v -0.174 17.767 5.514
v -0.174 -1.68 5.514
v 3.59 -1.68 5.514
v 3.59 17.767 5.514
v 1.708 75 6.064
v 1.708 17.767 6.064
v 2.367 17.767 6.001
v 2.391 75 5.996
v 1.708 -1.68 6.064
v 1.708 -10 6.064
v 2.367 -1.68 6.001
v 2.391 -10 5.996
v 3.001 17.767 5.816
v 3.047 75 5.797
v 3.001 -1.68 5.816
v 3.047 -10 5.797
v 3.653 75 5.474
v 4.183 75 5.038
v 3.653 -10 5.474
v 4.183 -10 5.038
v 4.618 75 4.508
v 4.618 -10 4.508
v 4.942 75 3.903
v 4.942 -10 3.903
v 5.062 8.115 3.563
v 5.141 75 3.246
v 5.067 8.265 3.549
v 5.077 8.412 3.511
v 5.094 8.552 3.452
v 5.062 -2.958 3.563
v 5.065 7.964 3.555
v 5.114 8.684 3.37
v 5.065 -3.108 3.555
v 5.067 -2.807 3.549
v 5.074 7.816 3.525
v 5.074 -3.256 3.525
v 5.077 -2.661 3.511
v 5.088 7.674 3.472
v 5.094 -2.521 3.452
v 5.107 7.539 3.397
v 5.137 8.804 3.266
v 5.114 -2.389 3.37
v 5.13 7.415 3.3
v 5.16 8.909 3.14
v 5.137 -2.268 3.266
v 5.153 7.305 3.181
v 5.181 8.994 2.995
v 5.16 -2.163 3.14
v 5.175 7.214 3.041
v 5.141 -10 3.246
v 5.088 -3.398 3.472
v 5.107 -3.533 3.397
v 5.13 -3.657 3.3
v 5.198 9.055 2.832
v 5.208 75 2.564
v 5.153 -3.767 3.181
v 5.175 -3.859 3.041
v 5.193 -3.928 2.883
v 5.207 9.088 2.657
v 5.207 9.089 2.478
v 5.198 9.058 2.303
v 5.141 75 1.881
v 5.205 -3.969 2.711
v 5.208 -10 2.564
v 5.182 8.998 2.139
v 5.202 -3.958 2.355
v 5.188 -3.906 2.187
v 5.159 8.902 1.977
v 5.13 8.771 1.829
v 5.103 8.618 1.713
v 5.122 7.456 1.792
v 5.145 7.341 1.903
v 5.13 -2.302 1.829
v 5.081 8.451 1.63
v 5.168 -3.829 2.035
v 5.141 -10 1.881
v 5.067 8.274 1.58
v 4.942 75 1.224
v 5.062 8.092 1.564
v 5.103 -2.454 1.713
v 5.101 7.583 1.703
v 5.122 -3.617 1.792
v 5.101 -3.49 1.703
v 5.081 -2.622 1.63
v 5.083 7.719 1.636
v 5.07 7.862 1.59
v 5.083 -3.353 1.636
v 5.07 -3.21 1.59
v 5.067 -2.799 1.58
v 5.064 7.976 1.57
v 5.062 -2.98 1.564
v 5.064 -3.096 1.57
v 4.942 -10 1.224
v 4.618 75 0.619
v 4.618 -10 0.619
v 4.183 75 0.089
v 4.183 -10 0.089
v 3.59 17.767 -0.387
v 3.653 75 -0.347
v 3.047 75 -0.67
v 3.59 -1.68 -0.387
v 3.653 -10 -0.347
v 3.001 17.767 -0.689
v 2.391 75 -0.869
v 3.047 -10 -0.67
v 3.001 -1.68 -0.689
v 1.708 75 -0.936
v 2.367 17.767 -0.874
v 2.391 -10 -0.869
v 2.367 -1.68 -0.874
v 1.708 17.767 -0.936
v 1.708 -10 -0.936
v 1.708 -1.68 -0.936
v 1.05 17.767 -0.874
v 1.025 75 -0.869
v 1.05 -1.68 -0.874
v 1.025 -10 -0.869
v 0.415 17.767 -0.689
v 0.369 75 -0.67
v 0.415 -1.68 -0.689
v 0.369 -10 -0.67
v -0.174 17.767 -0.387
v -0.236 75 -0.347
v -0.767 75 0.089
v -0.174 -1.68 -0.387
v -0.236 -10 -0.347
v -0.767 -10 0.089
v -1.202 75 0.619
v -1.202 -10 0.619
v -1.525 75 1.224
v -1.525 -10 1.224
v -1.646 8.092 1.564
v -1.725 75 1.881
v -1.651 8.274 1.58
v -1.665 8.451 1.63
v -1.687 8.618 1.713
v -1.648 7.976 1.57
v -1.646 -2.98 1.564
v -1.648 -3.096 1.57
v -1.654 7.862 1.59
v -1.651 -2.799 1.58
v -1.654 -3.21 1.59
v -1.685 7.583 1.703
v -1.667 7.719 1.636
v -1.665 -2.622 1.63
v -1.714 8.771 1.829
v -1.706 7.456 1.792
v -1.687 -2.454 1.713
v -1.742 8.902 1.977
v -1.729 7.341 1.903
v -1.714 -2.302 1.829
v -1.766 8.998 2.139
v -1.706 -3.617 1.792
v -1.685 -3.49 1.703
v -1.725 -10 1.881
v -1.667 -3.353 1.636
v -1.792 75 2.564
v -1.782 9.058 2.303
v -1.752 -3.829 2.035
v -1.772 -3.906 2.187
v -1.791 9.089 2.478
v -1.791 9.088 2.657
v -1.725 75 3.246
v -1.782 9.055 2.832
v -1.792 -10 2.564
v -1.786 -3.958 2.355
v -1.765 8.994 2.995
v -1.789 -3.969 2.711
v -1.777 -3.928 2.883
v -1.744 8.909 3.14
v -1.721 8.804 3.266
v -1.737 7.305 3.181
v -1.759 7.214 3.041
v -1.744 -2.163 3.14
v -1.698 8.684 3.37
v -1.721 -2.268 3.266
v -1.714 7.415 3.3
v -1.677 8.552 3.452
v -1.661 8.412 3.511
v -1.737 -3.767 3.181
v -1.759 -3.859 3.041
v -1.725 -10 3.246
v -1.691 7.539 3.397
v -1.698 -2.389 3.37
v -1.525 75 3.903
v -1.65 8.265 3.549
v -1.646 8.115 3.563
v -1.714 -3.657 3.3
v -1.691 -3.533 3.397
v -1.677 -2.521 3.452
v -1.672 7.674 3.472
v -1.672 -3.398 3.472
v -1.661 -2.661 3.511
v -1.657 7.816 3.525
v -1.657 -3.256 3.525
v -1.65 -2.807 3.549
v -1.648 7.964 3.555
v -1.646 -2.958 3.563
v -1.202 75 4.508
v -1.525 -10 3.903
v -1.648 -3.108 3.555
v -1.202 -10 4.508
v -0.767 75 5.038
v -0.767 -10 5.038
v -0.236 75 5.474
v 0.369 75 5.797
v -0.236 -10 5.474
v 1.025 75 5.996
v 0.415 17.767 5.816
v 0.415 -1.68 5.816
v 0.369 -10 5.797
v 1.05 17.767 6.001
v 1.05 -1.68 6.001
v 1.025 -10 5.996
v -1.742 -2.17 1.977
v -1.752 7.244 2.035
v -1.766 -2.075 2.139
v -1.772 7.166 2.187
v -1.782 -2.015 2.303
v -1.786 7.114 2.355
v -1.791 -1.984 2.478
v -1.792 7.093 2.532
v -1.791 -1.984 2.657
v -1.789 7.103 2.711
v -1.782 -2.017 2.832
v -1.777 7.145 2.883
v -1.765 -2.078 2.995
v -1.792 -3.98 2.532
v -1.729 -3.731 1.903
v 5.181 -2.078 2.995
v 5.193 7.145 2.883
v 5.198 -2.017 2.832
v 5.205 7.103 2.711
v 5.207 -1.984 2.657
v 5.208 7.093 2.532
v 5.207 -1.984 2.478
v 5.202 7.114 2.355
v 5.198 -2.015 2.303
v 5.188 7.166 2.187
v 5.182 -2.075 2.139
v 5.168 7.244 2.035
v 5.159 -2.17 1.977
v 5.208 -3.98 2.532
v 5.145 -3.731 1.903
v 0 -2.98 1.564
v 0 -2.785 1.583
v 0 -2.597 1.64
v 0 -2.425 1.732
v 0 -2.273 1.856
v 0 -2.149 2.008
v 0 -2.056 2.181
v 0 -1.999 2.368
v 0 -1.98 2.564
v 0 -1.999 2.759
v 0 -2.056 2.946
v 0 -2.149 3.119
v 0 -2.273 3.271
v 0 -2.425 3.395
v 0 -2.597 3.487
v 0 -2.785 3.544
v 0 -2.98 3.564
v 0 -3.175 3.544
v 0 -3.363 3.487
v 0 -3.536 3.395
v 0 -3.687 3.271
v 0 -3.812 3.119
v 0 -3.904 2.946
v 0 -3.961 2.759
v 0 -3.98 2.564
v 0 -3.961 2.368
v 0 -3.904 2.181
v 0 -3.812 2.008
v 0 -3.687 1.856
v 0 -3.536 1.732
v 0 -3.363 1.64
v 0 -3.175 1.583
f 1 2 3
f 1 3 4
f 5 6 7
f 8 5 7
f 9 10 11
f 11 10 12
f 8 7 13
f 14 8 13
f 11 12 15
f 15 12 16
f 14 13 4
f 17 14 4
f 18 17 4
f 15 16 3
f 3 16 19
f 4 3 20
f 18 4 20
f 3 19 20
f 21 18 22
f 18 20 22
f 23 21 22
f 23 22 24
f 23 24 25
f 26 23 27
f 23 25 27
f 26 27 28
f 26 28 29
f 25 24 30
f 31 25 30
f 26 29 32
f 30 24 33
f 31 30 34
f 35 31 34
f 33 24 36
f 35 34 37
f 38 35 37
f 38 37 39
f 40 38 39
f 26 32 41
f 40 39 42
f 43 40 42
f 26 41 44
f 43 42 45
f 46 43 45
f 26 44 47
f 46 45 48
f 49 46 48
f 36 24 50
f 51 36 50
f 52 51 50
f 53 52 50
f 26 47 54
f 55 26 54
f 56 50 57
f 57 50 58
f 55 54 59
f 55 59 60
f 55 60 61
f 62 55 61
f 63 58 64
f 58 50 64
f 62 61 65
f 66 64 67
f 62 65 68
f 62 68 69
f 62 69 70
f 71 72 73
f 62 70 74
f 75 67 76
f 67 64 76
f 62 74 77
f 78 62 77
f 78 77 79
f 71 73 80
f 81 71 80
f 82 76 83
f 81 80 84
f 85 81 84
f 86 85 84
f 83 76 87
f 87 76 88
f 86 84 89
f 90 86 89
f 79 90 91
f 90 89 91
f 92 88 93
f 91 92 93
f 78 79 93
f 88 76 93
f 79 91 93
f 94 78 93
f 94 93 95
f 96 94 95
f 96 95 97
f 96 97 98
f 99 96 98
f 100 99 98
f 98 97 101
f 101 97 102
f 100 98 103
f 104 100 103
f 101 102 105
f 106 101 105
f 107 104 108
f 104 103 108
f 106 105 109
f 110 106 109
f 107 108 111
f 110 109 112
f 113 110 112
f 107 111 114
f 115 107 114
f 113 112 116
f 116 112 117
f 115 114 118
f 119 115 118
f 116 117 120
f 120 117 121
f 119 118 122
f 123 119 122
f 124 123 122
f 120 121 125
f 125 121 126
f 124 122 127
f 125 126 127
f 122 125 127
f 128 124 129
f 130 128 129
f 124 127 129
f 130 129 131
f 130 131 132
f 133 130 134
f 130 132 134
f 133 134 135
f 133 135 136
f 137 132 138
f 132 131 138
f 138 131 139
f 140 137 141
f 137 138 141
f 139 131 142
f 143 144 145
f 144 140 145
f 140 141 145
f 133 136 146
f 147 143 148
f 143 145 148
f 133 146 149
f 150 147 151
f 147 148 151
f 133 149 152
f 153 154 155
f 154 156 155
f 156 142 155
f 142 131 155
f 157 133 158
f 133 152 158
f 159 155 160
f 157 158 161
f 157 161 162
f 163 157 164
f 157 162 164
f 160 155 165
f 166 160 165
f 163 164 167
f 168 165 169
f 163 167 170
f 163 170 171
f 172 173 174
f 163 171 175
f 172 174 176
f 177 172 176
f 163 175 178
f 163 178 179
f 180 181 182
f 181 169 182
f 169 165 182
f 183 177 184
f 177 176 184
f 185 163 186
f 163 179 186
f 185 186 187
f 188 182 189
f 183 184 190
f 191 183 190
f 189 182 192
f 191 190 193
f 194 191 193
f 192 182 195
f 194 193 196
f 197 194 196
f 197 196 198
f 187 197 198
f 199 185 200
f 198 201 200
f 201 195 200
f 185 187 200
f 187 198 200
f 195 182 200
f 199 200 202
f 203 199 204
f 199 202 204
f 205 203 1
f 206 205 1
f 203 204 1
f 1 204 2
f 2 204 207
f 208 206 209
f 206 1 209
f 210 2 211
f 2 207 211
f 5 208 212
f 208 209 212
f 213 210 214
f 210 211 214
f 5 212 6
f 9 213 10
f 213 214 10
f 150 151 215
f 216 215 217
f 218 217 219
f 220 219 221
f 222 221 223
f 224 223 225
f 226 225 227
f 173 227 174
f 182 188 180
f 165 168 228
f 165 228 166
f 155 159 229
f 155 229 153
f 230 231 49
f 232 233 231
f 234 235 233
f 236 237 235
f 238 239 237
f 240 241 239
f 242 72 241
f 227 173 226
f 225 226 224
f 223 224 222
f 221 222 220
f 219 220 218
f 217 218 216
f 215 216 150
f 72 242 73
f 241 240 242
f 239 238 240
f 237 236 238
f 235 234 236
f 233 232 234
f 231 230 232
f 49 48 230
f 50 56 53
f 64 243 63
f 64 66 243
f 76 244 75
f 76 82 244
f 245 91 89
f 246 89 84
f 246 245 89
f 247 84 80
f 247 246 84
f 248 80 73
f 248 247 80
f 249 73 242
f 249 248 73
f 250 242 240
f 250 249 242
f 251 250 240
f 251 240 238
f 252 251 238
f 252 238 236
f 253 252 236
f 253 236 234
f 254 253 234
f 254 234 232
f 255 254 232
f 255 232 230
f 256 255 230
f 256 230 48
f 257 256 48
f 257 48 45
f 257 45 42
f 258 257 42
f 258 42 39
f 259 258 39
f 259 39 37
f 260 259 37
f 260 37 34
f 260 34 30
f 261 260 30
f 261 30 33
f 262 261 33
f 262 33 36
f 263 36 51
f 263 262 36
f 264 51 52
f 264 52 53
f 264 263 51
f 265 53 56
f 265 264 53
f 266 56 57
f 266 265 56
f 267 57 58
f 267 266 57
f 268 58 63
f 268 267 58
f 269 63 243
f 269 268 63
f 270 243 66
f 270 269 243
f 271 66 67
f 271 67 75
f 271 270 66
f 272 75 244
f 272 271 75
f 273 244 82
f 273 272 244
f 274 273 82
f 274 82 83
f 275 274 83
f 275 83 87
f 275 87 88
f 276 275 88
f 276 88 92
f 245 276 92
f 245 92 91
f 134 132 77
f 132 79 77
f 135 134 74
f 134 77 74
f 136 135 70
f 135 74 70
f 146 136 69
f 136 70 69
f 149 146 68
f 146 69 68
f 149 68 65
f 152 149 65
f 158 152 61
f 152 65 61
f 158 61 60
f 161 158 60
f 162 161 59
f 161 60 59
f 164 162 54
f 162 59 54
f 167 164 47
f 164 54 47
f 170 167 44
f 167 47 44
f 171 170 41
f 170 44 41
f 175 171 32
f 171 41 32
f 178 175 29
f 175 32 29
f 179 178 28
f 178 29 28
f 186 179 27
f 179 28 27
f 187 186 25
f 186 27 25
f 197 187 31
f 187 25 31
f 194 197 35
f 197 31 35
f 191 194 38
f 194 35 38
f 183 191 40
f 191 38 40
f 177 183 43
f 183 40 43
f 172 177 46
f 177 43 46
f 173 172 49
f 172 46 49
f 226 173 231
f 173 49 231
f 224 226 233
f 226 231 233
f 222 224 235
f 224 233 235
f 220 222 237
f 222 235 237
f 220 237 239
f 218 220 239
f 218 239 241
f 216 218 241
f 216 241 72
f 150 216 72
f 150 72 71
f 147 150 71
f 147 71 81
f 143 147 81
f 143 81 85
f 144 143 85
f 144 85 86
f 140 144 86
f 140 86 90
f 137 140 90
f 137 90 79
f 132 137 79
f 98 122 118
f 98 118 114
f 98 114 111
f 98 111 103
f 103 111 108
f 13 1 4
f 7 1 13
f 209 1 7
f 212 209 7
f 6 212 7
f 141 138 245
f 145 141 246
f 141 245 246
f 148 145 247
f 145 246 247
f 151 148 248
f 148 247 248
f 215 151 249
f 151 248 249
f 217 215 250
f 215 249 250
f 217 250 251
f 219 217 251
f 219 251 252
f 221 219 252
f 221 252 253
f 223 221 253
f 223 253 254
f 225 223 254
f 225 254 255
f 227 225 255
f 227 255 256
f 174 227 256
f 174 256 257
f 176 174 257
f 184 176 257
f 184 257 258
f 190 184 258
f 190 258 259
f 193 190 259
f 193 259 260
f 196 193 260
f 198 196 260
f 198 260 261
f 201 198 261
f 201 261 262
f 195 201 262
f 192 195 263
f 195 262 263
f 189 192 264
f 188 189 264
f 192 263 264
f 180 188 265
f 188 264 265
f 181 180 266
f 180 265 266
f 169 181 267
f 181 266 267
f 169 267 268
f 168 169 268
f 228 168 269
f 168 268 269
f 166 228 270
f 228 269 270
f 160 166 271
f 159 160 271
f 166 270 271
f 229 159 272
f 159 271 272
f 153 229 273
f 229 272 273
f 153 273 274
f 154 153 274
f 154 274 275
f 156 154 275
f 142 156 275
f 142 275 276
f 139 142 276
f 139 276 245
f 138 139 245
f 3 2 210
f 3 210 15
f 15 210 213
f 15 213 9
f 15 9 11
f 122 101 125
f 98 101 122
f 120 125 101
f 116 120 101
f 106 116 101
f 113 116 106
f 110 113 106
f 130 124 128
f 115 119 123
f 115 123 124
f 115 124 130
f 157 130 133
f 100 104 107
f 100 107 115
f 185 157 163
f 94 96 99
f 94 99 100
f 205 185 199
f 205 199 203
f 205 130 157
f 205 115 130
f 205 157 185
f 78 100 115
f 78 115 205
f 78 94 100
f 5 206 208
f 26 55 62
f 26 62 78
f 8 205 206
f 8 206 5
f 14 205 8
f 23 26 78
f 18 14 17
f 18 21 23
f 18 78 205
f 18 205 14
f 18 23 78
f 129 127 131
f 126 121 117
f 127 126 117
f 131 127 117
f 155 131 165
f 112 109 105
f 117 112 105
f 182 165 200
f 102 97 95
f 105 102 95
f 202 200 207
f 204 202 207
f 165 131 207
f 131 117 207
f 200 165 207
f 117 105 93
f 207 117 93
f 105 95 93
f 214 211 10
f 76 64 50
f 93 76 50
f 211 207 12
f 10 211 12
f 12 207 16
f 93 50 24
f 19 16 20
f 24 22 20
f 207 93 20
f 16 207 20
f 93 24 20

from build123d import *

# Parameters (mm, degrees)
EXTRUDE_START       = -10
SKETCH_1_R          = 3.5
EXTRUDE_1_DEPTH     = 85
SKETCH_2_W          = 4.358557255
SKETCH_2_H          = 19.447665258
SKETCH_2_W_2        = 4.358557256
CUT_EXTRUDE_2_DEPTH = 9
SKETCH_3_R          = 1
CUT_EXTRUDE_3_DEPTH = 9


with BuildPart() as part:
    # Эскиз1 → Вытянуть1 (new body)
    with BuildSketch(Plane(origin=(0, 0, 0), x_dir=(1, 0, 0), z_dir=(0, 1, 0)).offset(EXTRUDE_START)):
        with Locations(Location((1.708090692, -2.563541488, 0), (0, 0, 270))):
            Circle(SKETCH_1_R)
    extrude(amount=EXTRUDE_1_DEPTH)

    # Эскиз2 → Вытянуть2 (cut, symmetric)
    with BuildSketch(Plane(origin=(0, 0, 0), x_dir=(0, 0, -1), z_dir=(1, 0, 0))):
        with Locations((-7.693664616, 8.043574294)):
            Rectangle(SKETCH_2_W, SKETCH_2_H)
        with Locations((2.56658164, 8.043574294)):
            Rectangle(SKETCH_2_W_2, SKETCH_2_H)
    extrude(amount=CUT_EXTRUDE_2_DEPTH, both=True, mode=Mode.SUBTRACT)

    # Эскиз3 → Вытянуть3 (cut, symmetric)
    with BuildSketch(Plane(origin=(0, 0, 0), x_dir=(0, 0, -1), z_dir=(1, 0, 0))):
        with Locations((-2.563541488, -2.980105713)):
            Circle(SKETCH_3_R)
        with Locations((-2.563541488, 8.092188022)):
            Circle(SKETCH_3_R)
    extrude(amount=CUT_EXTRUDE_3_DEPTH, both=True, mode=Mode.SUBTRACT)


solid = part.part
